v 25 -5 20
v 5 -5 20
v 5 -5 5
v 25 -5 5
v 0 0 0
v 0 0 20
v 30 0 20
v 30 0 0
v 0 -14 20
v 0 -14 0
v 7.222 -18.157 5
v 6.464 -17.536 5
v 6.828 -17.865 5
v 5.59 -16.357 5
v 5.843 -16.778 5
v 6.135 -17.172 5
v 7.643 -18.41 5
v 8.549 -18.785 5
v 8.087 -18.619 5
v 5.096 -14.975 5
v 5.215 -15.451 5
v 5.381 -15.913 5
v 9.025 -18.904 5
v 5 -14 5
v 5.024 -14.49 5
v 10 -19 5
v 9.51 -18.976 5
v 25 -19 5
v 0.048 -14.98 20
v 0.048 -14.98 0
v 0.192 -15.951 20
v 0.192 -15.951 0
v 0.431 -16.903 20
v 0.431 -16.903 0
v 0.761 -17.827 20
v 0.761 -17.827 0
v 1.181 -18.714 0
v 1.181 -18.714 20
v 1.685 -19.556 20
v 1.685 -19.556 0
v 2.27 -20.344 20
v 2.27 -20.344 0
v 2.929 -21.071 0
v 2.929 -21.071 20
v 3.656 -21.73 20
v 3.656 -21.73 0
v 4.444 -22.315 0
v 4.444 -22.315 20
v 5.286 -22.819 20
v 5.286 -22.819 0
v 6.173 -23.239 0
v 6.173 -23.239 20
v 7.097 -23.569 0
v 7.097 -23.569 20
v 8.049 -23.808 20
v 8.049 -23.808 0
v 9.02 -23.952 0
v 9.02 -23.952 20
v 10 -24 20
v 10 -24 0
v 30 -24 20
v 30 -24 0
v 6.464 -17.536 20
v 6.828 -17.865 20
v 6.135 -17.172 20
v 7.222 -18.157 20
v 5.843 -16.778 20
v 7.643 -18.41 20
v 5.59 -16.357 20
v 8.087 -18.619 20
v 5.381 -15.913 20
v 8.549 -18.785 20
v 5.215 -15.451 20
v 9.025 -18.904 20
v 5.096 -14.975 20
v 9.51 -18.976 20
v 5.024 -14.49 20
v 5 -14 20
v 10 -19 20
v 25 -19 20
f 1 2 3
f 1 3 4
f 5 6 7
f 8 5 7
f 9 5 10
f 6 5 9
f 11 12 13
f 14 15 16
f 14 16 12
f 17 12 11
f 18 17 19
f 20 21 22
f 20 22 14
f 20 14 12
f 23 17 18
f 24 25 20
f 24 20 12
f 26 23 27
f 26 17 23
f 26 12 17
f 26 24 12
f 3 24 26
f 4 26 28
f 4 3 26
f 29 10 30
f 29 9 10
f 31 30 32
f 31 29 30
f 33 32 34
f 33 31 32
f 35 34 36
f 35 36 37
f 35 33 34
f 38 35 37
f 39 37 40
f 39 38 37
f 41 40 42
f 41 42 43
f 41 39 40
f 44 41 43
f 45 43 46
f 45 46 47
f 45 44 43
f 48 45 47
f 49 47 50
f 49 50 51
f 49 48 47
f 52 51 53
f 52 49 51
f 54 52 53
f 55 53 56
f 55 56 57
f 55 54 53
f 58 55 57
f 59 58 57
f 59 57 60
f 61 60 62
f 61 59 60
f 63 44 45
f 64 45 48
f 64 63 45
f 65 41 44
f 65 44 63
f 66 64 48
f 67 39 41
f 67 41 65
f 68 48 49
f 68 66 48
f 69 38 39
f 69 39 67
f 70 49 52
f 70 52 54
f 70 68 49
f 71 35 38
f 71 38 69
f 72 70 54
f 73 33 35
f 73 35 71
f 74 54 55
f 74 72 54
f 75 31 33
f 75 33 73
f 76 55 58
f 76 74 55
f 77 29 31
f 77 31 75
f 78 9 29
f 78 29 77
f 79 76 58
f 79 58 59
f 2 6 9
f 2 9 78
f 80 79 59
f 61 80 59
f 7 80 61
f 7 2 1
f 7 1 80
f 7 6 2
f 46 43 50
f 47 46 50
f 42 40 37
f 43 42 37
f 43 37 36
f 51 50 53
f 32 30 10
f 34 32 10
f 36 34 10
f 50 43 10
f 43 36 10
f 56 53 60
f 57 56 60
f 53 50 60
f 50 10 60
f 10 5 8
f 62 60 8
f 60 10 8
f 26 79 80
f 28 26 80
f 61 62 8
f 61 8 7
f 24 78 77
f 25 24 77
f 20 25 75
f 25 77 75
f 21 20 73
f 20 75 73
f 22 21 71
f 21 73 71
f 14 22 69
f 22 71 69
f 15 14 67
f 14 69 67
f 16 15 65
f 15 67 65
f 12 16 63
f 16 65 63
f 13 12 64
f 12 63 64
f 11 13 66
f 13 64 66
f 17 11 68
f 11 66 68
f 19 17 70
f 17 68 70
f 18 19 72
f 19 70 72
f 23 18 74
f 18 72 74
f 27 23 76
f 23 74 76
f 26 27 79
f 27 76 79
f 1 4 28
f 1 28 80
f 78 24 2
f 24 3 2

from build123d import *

# Parameters (mm, degrees)
F0_W     = 30
F0_H     = 20
F1_DEPTH = 24
F2_R     = 10
F3_T     = -5


with BuildPart() as f1:
    # F0 (on Front) → F1 (new body)
    with BuildSketch(Plane.XZ):
        with Locations((15, 10)):
            Rectangle(F0_W, F0_H)
    extrude(amount=F1_DEPTH)

    # F2
    f2_edges = [f1.edges().sort_by_distance(p)[0] for p in [
        (0, -24, 10),
    ]]
    fillet(f2_edges, radius=F2_R)

    # F3
    f3_openings = [f1.faces().sort_by_distance(p)[0] for p in [
        (15.3922, -11.699964, 20),
    ]]
    offset(amount=F3_T, openings=f3_openings)


solid = f1.part
